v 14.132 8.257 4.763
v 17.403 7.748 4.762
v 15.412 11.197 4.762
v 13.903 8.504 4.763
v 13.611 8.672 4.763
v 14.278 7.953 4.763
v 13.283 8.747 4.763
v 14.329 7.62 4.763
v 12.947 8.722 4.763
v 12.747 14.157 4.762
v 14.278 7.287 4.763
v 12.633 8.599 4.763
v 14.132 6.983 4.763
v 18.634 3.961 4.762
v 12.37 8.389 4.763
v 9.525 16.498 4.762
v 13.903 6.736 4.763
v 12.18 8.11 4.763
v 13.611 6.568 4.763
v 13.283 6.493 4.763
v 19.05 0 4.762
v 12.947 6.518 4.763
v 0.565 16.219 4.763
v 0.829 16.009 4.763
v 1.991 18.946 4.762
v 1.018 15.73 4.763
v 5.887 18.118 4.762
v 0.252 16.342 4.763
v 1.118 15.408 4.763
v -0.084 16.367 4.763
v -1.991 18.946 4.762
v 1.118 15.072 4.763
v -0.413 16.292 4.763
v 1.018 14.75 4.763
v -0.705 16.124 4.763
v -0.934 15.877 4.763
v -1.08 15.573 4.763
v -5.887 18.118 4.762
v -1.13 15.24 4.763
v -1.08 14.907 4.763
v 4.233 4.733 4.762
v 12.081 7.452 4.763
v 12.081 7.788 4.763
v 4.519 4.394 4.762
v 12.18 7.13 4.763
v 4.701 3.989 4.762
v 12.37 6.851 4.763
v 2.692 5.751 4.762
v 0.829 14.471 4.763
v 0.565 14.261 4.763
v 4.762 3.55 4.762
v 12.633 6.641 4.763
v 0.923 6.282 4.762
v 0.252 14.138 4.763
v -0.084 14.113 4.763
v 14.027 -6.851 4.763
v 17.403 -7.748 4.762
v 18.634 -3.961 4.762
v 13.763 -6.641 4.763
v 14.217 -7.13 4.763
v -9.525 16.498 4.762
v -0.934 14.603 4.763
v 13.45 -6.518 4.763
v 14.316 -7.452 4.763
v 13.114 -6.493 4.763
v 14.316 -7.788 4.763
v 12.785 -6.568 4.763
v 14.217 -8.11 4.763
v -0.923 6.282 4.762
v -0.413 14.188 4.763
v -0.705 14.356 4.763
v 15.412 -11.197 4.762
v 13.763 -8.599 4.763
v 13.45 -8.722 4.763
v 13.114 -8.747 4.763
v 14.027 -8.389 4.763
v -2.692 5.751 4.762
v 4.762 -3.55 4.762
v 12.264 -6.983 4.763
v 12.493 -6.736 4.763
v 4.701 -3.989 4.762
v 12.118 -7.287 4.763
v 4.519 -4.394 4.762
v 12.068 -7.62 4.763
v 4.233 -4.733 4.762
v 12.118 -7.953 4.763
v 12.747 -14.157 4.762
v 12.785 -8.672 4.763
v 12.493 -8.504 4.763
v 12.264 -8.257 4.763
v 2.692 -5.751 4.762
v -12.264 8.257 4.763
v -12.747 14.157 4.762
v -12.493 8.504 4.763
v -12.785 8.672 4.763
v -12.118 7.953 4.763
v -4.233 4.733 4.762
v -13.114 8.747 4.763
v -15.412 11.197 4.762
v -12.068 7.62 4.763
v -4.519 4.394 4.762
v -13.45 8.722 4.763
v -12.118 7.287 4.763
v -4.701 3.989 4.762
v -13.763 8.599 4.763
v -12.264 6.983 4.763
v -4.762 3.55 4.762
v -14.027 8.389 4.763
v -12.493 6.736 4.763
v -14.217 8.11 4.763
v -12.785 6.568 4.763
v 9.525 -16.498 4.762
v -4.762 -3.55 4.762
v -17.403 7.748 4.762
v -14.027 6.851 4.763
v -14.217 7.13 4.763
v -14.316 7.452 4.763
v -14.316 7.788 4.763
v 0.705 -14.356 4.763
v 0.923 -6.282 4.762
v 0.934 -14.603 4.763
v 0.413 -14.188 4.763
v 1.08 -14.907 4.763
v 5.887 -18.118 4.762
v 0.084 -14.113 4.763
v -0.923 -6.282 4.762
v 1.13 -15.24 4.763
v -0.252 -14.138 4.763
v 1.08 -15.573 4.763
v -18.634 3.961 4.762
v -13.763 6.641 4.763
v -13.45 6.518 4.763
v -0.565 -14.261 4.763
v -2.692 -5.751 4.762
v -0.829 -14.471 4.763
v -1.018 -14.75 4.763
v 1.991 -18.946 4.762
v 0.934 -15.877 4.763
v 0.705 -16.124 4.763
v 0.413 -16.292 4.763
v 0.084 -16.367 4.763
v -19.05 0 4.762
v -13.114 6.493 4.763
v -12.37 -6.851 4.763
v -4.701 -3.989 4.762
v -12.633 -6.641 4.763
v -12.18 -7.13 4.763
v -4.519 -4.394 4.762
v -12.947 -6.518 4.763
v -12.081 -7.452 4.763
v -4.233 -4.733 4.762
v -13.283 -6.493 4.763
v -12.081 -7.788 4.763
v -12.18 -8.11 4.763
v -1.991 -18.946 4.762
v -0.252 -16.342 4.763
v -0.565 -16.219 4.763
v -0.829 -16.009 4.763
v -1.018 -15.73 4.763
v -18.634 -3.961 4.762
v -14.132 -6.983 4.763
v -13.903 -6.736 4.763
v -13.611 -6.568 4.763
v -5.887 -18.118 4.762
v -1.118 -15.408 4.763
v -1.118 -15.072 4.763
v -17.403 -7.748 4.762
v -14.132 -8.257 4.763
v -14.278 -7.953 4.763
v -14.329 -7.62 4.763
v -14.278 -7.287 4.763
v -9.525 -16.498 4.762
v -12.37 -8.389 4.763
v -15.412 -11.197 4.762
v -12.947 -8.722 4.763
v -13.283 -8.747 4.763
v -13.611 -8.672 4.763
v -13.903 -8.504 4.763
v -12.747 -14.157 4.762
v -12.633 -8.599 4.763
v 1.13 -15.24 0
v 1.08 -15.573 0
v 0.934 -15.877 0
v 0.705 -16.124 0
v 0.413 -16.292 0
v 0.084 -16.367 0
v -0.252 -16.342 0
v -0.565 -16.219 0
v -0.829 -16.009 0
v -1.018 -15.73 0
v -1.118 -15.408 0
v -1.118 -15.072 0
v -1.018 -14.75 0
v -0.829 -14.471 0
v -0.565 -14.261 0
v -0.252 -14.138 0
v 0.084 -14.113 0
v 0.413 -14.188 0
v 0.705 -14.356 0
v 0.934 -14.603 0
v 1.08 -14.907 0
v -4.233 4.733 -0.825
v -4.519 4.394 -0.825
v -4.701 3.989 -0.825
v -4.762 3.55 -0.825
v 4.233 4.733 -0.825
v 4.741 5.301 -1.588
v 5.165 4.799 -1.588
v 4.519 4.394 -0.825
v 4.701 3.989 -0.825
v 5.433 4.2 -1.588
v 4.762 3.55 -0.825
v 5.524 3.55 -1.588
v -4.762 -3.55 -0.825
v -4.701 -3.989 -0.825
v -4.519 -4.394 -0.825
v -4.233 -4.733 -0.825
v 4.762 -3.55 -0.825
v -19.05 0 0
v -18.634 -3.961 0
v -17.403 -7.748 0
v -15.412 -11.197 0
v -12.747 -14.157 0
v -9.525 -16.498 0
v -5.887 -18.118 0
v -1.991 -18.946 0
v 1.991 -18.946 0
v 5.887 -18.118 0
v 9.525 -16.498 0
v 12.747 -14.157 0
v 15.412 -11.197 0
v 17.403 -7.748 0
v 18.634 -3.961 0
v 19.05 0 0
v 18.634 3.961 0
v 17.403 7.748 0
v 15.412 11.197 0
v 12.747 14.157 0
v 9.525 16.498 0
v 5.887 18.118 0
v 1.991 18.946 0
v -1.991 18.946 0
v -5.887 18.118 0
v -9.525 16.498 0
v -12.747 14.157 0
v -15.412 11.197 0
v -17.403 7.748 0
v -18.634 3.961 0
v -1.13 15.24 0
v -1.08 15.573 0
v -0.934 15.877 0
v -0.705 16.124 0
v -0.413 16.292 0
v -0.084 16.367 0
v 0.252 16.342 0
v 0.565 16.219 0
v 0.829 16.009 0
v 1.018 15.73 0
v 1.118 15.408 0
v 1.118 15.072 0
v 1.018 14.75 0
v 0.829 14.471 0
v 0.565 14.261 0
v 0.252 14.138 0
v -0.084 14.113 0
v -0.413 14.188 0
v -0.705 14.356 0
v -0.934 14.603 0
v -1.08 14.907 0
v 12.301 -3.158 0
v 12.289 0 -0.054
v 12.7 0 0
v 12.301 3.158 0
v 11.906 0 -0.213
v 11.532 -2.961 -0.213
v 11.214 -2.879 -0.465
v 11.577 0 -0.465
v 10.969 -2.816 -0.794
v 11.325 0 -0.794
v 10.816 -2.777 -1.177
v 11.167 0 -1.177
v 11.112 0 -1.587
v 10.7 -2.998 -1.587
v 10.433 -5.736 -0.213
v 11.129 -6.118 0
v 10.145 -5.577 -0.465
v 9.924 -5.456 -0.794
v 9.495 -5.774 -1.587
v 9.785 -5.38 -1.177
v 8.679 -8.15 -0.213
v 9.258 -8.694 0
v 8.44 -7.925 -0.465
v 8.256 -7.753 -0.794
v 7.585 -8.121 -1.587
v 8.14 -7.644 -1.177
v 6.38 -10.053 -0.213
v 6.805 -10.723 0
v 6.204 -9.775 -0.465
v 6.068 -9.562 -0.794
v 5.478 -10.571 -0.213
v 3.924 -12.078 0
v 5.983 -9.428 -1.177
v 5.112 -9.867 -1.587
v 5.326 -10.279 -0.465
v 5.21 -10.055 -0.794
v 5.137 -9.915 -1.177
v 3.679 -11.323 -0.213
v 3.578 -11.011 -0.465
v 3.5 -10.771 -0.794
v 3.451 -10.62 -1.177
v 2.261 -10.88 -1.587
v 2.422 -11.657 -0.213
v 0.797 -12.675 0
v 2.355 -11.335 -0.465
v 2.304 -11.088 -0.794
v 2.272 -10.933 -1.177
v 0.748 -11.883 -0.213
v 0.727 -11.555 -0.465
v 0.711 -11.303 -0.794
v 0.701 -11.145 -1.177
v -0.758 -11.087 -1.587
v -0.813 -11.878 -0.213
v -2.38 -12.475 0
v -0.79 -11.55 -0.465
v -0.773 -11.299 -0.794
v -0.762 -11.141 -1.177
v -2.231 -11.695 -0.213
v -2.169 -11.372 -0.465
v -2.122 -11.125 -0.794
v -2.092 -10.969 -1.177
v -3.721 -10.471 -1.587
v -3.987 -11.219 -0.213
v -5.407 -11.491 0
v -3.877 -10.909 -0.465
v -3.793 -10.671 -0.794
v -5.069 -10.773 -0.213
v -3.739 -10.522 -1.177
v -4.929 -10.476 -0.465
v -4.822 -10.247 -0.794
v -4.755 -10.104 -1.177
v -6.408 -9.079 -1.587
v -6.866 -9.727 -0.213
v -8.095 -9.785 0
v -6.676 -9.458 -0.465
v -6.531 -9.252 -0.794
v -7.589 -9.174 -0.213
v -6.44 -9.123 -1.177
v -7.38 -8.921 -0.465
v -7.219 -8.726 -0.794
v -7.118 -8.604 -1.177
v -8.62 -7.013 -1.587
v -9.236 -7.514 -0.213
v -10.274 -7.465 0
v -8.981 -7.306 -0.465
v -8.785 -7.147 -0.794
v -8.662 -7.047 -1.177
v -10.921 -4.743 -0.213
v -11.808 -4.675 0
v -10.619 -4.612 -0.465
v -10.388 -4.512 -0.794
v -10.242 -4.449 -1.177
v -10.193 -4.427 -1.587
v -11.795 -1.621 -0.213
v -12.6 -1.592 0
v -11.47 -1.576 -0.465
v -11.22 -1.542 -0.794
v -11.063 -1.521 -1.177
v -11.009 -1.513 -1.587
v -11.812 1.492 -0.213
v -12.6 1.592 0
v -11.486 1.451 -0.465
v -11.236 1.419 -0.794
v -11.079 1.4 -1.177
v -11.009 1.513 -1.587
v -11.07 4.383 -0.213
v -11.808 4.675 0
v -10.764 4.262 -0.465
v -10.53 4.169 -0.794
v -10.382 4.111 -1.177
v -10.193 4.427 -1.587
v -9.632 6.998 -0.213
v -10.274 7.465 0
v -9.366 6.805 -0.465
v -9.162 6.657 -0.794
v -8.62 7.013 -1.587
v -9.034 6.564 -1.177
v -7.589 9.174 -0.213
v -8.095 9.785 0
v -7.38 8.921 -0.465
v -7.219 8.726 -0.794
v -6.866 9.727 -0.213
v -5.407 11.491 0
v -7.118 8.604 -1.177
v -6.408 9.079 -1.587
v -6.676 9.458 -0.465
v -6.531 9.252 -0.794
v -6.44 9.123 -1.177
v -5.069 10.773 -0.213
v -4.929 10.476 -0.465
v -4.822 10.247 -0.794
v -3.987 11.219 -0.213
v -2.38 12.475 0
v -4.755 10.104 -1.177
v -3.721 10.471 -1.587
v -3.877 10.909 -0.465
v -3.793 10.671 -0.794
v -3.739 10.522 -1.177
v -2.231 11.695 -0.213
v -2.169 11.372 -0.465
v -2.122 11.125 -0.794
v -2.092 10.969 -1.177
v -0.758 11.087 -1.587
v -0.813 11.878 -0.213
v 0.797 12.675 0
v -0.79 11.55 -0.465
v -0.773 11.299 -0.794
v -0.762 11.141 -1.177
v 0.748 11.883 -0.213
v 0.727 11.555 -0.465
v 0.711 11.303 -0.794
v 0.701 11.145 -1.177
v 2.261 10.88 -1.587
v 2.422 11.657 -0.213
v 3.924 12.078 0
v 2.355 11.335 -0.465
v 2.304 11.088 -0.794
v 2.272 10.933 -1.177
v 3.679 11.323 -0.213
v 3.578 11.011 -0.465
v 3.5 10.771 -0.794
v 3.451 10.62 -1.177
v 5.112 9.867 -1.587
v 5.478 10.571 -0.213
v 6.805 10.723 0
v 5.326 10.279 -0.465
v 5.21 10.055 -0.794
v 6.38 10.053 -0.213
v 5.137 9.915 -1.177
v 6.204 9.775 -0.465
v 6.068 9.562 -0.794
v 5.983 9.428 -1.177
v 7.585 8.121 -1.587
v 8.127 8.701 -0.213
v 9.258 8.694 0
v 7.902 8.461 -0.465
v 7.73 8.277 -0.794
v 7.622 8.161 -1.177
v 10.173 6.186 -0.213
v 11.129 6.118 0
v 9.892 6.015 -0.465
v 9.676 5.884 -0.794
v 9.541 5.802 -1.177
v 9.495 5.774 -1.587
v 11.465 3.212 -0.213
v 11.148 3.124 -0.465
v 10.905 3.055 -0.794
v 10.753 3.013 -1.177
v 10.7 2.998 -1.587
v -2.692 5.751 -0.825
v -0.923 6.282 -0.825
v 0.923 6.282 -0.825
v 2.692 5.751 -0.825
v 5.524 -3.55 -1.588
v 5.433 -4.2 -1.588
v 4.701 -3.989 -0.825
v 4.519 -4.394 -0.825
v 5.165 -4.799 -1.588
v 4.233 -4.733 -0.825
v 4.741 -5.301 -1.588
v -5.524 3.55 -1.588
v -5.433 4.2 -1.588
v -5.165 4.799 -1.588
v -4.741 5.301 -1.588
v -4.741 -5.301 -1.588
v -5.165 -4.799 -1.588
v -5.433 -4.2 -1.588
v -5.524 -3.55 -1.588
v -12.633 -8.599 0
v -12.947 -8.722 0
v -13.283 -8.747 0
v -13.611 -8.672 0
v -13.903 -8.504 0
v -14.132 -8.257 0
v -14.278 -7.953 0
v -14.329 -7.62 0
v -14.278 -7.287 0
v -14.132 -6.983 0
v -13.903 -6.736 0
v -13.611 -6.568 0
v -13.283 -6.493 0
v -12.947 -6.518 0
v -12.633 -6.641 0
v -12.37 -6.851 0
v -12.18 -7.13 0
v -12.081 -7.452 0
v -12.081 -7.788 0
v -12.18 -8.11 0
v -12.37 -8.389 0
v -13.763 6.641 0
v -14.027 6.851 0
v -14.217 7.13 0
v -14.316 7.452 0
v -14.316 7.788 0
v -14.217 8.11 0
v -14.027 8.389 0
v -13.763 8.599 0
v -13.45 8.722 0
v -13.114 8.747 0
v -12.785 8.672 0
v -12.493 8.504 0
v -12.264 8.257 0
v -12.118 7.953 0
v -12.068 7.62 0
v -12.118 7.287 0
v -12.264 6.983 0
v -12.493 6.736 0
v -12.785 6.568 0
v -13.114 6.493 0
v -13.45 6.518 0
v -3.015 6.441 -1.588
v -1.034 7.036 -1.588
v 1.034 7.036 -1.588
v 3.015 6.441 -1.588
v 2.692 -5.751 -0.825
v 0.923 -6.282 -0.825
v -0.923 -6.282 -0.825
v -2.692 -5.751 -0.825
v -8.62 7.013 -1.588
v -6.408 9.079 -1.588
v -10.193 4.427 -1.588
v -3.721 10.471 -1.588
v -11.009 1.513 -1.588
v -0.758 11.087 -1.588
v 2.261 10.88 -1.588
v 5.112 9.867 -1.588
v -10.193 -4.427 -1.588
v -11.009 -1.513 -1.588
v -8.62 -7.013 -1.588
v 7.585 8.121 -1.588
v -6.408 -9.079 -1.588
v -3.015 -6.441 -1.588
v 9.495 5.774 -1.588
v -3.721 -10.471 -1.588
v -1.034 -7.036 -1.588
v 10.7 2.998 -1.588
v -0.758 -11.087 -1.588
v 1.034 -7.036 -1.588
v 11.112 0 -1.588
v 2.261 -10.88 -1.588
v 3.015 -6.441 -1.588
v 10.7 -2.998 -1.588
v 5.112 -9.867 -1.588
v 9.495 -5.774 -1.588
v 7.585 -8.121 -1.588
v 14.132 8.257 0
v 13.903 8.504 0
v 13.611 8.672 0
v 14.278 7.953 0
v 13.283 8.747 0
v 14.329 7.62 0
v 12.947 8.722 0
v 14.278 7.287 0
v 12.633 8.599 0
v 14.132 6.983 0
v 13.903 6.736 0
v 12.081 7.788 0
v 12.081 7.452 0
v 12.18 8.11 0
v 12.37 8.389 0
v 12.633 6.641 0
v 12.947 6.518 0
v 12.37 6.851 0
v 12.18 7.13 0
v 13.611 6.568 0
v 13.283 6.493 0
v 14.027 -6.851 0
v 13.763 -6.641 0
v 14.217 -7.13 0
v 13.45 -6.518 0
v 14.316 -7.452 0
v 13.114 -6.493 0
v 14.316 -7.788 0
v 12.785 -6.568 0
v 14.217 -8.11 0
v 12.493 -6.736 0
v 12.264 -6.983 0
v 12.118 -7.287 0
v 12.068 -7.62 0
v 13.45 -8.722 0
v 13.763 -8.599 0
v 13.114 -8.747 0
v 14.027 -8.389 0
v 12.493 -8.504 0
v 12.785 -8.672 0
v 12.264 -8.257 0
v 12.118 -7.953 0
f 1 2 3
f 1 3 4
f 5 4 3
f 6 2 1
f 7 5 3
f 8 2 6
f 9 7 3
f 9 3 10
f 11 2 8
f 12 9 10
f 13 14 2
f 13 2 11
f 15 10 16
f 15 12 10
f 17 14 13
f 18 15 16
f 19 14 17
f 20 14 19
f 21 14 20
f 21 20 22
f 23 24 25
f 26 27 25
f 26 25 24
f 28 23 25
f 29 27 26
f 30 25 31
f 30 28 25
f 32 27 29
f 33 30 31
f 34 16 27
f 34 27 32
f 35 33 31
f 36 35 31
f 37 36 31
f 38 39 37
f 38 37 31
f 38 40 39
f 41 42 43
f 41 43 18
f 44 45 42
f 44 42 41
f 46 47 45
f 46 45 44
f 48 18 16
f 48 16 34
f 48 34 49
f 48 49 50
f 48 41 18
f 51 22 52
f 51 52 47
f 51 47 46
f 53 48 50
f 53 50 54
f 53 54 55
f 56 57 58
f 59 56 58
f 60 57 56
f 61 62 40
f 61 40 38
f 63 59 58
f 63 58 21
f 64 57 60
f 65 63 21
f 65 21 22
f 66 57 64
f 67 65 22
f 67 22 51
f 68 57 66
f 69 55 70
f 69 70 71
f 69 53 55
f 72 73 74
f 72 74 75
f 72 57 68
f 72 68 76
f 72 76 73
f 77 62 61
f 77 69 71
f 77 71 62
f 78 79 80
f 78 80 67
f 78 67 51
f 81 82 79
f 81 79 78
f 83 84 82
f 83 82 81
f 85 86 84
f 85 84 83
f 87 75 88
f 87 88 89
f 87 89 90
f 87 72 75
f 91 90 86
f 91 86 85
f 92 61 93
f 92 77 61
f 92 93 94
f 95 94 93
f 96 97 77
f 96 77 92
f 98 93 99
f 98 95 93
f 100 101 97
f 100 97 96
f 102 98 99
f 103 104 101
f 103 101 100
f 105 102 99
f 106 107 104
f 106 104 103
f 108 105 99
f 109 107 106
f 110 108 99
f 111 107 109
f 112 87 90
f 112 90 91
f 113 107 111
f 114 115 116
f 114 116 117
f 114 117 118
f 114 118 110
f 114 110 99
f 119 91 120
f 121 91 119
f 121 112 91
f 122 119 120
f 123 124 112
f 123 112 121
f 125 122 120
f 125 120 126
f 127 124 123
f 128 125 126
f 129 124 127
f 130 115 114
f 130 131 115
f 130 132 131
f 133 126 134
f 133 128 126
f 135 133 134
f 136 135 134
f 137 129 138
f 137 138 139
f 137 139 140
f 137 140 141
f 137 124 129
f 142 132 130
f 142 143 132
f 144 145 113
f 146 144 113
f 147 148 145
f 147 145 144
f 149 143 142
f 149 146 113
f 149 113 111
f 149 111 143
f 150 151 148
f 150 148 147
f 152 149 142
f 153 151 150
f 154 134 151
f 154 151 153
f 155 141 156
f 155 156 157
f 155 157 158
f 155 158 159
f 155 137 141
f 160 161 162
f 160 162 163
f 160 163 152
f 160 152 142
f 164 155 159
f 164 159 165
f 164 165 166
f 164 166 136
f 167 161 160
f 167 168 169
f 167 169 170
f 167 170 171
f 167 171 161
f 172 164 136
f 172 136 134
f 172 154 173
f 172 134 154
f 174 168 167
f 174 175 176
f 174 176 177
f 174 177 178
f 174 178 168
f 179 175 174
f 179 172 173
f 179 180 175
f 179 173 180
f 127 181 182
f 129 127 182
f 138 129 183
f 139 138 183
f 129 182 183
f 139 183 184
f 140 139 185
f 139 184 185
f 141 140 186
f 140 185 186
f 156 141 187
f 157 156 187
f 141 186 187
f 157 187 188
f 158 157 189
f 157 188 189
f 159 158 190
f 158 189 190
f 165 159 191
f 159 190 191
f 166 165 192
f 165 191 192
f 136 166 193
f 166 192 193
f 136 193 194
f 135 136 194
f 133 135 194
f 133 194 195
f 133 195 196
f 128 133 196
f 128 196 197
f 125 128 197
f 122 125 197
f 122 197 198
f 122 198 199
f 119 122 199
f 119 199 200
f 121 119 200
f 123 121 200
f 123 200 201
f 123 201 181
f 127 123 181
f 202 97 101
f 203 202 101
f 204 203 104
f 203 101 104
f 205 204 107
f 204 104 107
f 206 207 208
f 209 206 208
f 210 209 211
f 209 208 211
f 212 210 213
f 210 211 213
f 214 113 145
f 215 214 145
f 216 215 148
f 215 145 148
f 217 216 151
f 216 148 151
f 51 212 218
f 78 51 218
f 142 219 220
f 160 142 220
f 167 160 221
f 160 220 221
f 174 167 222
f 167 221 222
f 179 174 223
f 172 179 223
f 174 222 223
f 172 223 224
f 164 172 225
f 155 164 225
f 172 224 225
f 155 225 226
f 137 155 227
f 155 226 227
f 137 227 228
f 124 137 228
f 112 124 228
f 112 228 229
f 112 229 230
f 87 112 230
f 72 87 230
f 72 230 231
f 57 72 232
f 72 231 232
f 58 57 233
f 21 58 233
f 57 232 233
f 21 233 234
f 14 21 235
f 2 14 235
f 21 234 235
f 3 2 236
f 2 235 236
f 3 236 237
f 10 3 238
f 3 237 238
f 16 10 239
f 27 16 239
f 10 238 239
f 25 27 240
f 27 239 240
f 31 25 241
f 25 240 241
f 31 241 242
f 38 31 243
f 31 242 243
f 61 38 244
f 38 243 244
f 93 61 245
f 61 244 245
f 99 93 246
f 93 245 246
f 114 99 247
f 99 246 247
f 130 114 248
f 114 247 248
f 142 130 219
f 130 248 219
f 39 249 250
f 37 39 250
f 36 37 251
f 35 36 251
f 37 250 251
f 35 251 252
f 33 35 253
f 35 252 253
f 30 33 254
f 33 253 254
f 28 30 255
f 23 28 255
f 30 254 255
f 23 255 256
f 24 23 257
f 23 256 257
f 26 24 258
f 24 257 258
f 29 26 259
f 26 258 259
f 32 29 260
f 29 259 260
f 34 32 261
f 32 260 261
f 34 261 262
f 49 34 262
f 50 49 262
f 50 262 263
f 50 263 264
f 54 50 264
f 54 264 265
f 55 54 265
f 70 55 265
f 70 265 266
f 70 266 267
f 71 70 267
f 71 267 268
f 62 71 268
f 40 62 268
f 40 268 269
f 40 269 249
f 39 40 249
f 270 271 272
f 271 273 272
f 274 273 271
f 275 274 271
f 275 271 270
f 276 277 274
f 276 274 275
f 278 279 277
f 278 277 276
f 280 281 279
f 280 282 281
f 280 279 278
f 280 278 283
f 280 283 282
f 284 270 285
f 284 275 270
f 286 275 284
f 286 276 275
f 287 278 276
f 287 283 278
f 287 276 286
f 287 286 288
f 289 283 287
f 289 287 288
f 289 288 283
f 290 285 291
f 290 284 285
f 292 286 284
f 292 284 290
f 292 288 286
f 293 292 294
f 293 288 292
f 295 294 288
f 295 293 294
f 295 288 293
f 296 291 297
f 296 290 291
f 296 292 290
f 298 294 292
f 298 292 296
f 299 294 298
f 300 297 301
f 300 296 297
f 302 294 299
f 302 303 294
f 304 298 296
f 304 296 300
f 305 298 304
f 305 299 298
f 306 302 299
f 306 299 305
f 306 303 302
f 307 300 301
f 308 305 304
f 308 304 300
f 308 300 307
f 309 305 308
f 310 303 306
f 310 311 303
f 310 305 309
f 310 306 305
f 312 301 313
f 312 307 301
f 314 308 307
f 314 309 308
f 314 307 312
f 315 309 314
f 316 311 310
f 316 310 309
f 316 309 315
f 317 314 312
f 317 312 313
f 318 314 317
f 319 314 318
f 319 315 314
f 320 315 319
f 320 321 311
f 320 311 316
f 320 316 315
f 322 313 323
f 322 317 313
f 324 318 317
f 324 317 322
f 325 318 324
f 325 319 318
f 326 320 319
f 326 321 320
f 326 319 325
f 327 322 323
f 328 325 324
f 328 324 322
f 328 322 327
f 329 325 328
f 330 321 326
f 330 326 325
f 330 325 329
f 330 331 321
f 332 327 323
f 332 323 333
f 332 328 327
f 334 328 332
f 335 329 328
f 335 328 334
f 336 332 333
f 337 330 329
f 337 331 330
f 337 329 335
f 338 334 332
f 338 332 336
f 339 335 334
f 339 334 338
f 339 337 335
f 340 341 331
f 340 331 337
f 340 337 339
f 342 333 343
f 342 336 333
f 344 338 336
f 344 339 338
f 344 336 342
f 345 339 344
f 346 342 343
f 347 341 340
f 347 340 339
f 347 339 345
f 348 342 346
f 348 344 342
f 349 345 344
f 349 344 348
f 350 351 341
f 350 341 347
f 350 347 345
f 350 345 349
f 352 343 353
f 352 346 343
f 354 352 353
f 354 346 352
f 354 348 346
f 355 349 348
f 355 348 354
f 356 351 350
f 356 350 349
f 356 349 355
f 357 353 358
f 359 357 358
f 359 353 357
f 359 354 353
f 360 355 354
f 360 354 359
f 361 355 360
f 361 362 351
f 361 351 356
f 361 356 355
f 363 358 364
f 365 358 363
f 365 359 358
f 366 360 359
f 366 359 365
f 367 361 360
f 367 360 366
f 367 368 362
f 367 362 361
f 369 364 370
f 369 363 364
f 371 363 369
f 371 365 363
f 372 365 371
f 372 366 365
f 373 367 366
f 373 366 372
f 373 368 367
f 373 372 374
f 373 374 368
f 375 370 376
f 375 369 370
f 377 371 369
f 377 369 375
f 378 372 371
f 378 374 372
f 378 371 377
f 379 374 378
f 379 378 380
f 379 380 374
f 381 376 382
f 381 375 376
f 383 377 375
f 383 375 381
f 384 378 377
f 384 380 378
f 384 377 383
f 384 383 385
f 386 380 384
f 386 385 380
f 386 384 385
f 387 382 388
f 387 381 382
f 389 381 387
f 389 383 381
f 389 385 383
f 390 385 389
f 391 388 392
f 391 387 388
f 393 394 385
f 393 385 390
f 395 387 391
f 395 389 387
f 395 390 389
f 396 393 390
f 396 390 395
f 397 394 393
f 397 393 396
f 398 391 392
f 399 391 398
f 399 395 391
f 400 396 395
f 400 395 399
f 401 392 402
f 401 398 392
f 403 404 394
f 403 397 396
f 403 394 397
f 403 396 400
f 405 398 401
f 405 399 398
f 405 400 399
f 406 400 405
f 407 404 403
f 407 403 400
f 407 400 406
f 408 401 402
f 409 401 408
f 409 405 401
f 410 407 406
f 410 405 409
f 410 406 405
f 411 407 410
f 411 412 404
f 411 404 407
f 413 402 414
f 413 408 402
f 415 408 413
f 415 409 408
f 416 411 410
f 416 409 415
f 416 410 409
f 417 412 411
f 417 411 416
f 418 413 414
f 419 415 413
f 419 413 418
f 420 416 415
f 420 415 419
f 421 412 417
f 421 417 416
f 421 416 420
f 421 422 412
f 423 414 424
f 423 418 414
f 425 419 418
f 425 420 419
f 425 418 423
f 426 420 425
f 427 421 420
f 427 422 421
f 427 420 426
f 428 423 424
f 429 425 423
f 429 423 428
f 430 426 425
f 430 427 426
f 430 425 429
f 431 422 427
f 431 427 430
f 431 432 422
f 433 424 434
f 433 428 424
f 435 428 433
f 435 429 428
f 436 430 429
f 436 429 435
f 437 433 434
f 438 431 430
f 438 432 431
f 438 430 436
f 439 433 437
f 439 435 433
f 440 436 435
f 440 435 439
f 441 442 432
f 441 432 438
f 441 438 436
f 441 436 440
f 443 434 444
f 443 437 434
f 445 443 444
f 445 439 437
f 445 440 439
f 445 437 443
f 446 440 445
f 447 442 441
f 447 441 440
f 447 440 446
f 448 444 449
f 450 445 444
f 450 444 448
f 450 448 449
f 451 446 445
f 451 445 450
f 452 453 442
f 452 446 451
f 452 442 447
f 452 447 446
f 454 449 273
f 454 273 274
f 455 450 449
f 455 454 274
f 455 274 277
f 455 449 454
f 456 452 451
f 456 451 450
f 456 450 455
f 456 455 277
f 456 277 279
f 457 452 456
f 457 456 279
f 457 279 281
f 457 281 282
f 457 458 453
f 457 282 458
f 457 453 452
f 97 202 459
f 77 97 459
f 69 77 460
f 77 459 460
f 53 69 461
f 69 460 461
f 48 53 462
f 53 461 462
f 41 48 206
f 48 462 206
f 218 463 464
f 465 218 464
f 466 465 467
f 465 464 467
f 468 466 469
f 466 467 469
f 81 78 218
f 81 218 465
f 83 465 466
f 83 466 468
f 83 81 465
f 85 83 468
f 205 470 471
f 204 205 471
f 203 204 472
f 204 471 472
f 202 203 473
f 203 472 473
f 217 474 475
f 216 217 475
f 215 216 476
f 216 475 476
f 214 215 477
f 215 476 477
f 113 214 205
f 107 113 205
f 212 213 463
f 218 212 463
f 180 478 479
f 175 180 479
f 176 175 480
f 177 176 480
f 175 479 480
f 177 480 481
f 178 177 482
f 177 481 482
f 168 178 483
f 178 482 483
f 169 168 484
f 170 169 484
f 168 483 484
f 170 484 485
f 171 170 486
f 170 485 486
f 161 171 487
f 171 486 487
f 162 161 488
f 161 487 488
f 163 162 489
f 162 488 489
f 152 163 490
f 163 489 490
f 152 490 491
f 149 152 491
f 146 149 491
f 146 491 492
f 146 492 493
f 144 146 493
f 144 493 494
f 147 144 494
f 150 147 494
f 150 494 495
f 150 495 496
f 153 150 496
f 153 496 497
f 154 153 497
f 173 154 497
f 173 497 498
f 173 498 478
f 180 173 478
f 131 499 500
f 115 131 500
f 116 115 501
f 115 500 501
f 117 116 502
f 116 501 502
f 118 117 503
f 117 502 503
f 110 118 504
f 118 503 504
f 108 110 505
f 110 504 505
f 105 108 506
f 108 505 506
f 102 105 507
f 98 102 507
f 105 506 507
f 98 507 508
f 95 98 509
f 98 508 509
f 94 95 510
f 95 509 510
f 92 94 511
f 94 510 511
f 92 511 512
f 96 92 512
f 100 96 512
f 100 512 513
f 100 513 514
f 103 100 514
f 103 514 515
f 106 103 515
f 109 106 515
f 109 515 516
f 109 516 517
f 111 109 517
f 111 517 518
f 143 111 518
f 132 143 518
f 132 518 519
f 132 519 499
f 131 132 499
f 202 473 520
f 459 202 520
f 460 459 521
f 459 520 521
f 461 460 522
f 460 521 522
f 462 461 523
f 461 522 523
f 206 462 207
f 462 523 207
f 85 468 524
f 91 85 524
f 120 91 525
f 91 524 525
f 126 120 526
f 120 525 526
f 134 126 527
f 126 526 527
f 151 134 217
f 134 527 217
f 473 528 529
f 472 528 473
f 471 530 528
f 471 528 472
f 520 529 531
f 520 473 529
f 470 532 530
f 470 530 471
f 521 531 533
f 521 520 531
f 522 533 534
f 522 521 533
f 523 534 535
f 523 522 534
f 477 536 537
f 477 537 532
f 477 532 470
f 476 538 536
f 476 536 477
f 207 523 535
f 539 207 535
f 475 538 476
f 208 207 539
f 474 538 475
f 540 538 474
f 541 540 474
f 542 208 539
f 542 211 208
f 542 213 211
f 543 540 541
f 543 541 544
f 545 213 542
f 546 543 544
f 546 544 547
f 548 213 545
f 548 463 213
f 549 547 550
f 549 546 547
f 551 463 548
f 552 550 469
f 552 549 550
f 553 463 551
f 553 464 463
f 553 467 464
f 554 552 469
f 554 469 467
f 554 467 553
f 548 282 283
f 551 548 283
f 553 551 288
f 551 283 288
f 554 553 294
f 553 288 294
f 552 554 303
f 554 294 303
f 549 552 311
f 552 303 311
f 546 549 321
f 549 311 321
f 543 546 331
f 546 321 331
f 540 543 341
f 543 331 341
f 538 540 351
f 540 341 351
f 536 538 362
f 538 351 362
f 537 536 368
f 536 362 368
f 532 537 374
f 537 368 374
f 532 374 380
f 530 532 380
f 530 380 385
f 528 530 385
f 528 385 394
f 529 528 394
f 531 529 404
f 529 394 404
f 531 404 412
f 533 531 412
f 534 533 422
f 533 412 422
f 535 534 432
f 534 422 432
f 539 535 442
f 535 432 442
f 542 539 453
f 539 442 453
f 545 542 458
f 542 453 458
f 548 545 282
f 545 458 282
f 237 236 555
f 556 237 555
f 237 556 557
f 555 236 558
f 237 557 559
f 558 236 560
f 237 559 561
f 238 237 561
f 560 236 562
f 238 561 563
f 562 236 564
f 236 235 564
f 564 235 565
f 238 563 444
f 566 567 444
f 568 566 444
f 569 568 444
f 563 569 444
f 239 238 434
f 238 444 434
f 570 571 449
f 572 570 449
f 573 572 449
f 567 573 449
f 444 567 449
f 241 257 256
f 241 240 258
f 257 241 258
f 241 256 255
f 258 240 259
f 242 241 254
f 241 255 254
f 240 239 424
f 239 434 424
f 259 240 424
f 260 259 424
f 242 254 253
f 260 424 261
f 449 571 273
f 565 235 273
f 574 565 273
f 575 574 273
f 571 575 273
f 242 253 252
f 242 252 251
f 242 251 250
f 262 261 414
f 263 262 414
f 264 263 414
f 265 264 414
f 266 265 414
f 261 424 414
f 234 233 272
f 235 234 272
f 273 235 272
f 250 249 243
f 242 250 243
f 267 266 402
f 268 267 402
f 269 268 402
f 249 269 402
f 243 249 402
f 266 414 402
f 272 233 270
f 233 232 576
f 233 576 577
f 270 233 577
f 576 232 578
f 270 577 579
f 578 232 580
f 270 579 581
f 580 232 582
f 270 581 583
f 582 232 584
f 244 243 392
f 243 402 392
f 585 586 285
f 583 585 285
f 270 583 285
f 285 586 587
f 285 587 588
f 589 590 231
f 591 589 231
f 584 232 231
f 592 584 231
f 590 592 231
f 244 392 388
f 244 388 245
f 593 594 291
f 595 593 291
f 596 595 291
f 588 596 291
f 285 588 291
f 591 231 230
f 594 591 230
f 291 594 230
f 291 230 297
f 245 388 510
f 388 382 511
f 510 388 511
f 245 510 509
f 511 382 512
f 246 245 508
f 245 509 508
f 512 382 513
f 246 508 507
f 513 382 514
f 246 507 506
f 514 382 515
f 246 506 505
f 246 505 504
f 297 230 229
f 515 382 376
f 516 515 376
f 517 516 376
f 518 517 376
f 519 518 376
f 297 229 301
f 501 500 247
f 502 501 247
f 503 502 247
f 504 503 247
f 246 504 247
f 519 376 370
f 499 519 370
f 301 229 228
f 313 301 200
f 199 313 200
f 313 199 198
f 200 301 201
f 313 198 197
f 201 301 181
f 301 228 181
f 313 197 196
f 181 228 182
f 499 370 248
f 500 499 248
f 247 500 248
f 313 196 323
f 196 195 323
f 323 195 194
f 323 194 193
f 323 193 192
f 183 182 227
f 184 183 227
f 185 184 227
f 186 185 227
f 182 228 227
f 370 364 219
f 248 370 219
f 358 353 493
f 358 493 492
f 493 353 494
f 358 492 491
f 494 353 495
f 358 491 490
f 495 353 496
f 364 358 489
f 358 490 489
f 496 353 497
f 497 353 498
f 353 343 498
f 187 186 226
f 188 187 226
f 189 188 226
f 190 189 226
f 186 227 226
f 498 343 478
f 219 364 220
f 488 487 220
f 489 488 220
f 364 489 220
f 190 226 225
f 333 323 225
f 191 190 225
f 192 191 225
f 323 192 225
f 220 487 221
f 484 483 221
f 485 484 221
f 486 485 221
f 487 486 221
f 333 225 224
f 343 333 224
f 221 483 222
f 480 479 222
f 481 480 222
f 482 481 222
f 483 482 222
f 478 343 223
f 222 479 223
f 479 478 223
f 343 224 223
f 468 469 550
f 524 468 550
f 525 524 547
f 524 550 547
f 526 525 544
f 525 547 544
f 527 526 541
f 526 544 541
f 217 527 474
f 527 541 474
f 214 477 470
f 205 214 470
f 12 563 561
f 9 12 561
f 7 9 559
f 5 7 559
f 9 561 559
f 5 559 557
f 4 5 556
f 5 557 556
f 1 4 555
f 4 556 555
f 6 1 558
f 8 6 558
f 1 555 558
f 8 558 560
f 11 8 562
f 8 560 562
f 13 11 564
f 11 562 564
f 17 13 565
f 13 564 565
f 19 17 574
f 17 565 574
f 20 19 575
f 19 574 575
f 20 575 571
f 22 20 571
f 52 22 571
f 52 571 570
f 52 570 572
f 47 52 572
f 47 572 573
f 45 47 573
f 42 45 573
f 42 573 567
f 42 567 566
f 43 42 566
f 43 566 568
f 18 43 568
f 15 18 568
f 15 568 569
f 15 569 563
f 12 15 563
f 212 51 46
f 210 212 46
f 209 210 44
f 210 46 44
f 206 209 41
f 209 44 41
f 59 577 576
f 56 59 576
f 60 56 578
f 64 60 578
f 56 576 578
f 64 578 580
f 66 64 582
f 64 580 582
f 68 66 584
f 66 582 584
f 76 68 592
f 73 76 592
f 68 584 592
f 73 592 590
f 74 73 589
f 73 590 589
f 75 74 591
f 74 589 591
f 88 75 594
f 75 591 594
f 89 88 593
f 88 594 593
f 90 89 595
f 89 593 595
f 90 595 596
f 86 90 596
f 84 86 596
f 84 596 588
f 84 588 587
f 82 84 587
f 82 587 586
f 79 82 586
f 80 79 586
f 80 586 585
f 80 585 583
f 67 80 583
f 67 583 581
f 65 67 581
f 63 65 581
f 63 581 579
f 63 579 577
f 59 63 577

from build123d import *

# Parameters (mm, degrees)
SKETCH1_R             = 19.05
BOSS_EXTRUDE1_DEPTH   = 4.7625
SKETCH2_R             = 11.1125
BOSS_EXTRUDE2_DEPTH   = 1.5875
FILLET1_R             = 1.5875
CUT_EXTRUDE1_DEPTH    = 28.679008291
FILLET2_R             = 1.5875
F_4_40_TAPPED_HOLE1_D = 2.2606
CIRPATTERN1_COUNT     = 6
CHAMFER1_SIZE         = 0.762


with BuildPart() as part:
    # Sketch1 → Boss-Extrude1 (new body)
    with BuildSketch(Plane.XY):
        with Locations(Location((0, 0, 0), (0, 0, 180))):
            Circle(SKETCH1_R)
    extrude(amount=BOSS_EXTRUDE1_DEPTH)

    # Sketch2 → Boss-Extrude2 (add)
    with BuildSketch(Plane(origin=(0, 0, 0), x_dir=(-1, 0, 0), z_dir=(0, 0, -1))):
        with Locations(Location((0, 0, 0), (0, 0, 180))):
            Circle(SKETCH2_R)
    extrude(amount=BOSS_EXTRUDE2_DEPTH)

    # Fillet1
    fillet1_edges = [part.edges().sort_by_distance(p)[0] for p in [
        (-11.1125, 0, 0),
    ]]
    fillet(fillet1_edges, radius=FILLET1_R - 0.0001)  # a hair under: the kernel refuses the full size

    # Sketch3 → Cut-Extrude1 (cut, through all)
    with BuildSketch(Plane(origin=(0, 0, -1.5875), x_dir=(-1, 0, 0), z_dir=(0, 0, -1))):
        with BuildLine():
            Line((-4.7625, 4.200130206), (-4.7625, -4.200130206))
            ThreePointArc((-4.7625, -4.200130206), (0, -6.35), (4.7625, -4.200130206))
            Line((4.7625, -4.200130206), (4.7625, 4.200130206))
            ThreePointArc((4.7625, 4.200130206), (0, 6.35), (-4.7625, 4.200130206))
        make_face()
    extrude(amount=-CUT_EXTRUDE1_DEPTH, mode=Mode.SUBTRACT)

    # Fillet2
    fillet2_edges = [part.edges().sort_by_distance(p)[0] for p in [
        (4.7625, 4.200130206, 1.5875),
        (-4.7625, 4.200130206, 1.5875),
        (-4.7625, -4.200130206, 1.5875),
        (4.7625, -4.200130206, 1.5875),
    ]]
    fillet(fillet2_edges, radius=FILLET2_R)

    # #4-40 Tapped Hole1 (through all)
    with Locations(Plane.XY.offset(4.7625)):
        with Locations((0, 15.24)):
            f_4_40_tapped_hole1 = Hole(F_4_40_TAPPED_HOLE1_D / 2)

    # CirPattern1: #4-40 Tapped Hole1 ×6 about axis
    cirpattern1_axis = Axis((0, 0, 0), (0, 0, 1))
    for i in range(1, CIRPATTERN1_COUNT):
        add(f_4_40_tapped_hole1.rotate(cirpattern1_axis, i * 360 / CIRPATTERN1_COUNT), mode=Mode.SUBTRACT)

    # Chamfer1
    chamfer1_edges = [part.edges().sort_by_distance(p)[0] for p in [
        (-4.7625, 0, -1.5875),
        (0, -6.35, -1.5875),
        (4.7625, 0, -1.5875),
        (0, 6.35, -1.5875),
        (-4.6241826, -4.197852075, -1.5875),
        (4.6241826, -4.197852075, -1.5875),
        (-4.6241826, 4.197852075, -1.5875),
        (4.6241826, 4.197852075, -1.5875),
    ]]
    chamfer(chamfer1_edges, length=CHAMFER1_SIZE)


solid = part.part
